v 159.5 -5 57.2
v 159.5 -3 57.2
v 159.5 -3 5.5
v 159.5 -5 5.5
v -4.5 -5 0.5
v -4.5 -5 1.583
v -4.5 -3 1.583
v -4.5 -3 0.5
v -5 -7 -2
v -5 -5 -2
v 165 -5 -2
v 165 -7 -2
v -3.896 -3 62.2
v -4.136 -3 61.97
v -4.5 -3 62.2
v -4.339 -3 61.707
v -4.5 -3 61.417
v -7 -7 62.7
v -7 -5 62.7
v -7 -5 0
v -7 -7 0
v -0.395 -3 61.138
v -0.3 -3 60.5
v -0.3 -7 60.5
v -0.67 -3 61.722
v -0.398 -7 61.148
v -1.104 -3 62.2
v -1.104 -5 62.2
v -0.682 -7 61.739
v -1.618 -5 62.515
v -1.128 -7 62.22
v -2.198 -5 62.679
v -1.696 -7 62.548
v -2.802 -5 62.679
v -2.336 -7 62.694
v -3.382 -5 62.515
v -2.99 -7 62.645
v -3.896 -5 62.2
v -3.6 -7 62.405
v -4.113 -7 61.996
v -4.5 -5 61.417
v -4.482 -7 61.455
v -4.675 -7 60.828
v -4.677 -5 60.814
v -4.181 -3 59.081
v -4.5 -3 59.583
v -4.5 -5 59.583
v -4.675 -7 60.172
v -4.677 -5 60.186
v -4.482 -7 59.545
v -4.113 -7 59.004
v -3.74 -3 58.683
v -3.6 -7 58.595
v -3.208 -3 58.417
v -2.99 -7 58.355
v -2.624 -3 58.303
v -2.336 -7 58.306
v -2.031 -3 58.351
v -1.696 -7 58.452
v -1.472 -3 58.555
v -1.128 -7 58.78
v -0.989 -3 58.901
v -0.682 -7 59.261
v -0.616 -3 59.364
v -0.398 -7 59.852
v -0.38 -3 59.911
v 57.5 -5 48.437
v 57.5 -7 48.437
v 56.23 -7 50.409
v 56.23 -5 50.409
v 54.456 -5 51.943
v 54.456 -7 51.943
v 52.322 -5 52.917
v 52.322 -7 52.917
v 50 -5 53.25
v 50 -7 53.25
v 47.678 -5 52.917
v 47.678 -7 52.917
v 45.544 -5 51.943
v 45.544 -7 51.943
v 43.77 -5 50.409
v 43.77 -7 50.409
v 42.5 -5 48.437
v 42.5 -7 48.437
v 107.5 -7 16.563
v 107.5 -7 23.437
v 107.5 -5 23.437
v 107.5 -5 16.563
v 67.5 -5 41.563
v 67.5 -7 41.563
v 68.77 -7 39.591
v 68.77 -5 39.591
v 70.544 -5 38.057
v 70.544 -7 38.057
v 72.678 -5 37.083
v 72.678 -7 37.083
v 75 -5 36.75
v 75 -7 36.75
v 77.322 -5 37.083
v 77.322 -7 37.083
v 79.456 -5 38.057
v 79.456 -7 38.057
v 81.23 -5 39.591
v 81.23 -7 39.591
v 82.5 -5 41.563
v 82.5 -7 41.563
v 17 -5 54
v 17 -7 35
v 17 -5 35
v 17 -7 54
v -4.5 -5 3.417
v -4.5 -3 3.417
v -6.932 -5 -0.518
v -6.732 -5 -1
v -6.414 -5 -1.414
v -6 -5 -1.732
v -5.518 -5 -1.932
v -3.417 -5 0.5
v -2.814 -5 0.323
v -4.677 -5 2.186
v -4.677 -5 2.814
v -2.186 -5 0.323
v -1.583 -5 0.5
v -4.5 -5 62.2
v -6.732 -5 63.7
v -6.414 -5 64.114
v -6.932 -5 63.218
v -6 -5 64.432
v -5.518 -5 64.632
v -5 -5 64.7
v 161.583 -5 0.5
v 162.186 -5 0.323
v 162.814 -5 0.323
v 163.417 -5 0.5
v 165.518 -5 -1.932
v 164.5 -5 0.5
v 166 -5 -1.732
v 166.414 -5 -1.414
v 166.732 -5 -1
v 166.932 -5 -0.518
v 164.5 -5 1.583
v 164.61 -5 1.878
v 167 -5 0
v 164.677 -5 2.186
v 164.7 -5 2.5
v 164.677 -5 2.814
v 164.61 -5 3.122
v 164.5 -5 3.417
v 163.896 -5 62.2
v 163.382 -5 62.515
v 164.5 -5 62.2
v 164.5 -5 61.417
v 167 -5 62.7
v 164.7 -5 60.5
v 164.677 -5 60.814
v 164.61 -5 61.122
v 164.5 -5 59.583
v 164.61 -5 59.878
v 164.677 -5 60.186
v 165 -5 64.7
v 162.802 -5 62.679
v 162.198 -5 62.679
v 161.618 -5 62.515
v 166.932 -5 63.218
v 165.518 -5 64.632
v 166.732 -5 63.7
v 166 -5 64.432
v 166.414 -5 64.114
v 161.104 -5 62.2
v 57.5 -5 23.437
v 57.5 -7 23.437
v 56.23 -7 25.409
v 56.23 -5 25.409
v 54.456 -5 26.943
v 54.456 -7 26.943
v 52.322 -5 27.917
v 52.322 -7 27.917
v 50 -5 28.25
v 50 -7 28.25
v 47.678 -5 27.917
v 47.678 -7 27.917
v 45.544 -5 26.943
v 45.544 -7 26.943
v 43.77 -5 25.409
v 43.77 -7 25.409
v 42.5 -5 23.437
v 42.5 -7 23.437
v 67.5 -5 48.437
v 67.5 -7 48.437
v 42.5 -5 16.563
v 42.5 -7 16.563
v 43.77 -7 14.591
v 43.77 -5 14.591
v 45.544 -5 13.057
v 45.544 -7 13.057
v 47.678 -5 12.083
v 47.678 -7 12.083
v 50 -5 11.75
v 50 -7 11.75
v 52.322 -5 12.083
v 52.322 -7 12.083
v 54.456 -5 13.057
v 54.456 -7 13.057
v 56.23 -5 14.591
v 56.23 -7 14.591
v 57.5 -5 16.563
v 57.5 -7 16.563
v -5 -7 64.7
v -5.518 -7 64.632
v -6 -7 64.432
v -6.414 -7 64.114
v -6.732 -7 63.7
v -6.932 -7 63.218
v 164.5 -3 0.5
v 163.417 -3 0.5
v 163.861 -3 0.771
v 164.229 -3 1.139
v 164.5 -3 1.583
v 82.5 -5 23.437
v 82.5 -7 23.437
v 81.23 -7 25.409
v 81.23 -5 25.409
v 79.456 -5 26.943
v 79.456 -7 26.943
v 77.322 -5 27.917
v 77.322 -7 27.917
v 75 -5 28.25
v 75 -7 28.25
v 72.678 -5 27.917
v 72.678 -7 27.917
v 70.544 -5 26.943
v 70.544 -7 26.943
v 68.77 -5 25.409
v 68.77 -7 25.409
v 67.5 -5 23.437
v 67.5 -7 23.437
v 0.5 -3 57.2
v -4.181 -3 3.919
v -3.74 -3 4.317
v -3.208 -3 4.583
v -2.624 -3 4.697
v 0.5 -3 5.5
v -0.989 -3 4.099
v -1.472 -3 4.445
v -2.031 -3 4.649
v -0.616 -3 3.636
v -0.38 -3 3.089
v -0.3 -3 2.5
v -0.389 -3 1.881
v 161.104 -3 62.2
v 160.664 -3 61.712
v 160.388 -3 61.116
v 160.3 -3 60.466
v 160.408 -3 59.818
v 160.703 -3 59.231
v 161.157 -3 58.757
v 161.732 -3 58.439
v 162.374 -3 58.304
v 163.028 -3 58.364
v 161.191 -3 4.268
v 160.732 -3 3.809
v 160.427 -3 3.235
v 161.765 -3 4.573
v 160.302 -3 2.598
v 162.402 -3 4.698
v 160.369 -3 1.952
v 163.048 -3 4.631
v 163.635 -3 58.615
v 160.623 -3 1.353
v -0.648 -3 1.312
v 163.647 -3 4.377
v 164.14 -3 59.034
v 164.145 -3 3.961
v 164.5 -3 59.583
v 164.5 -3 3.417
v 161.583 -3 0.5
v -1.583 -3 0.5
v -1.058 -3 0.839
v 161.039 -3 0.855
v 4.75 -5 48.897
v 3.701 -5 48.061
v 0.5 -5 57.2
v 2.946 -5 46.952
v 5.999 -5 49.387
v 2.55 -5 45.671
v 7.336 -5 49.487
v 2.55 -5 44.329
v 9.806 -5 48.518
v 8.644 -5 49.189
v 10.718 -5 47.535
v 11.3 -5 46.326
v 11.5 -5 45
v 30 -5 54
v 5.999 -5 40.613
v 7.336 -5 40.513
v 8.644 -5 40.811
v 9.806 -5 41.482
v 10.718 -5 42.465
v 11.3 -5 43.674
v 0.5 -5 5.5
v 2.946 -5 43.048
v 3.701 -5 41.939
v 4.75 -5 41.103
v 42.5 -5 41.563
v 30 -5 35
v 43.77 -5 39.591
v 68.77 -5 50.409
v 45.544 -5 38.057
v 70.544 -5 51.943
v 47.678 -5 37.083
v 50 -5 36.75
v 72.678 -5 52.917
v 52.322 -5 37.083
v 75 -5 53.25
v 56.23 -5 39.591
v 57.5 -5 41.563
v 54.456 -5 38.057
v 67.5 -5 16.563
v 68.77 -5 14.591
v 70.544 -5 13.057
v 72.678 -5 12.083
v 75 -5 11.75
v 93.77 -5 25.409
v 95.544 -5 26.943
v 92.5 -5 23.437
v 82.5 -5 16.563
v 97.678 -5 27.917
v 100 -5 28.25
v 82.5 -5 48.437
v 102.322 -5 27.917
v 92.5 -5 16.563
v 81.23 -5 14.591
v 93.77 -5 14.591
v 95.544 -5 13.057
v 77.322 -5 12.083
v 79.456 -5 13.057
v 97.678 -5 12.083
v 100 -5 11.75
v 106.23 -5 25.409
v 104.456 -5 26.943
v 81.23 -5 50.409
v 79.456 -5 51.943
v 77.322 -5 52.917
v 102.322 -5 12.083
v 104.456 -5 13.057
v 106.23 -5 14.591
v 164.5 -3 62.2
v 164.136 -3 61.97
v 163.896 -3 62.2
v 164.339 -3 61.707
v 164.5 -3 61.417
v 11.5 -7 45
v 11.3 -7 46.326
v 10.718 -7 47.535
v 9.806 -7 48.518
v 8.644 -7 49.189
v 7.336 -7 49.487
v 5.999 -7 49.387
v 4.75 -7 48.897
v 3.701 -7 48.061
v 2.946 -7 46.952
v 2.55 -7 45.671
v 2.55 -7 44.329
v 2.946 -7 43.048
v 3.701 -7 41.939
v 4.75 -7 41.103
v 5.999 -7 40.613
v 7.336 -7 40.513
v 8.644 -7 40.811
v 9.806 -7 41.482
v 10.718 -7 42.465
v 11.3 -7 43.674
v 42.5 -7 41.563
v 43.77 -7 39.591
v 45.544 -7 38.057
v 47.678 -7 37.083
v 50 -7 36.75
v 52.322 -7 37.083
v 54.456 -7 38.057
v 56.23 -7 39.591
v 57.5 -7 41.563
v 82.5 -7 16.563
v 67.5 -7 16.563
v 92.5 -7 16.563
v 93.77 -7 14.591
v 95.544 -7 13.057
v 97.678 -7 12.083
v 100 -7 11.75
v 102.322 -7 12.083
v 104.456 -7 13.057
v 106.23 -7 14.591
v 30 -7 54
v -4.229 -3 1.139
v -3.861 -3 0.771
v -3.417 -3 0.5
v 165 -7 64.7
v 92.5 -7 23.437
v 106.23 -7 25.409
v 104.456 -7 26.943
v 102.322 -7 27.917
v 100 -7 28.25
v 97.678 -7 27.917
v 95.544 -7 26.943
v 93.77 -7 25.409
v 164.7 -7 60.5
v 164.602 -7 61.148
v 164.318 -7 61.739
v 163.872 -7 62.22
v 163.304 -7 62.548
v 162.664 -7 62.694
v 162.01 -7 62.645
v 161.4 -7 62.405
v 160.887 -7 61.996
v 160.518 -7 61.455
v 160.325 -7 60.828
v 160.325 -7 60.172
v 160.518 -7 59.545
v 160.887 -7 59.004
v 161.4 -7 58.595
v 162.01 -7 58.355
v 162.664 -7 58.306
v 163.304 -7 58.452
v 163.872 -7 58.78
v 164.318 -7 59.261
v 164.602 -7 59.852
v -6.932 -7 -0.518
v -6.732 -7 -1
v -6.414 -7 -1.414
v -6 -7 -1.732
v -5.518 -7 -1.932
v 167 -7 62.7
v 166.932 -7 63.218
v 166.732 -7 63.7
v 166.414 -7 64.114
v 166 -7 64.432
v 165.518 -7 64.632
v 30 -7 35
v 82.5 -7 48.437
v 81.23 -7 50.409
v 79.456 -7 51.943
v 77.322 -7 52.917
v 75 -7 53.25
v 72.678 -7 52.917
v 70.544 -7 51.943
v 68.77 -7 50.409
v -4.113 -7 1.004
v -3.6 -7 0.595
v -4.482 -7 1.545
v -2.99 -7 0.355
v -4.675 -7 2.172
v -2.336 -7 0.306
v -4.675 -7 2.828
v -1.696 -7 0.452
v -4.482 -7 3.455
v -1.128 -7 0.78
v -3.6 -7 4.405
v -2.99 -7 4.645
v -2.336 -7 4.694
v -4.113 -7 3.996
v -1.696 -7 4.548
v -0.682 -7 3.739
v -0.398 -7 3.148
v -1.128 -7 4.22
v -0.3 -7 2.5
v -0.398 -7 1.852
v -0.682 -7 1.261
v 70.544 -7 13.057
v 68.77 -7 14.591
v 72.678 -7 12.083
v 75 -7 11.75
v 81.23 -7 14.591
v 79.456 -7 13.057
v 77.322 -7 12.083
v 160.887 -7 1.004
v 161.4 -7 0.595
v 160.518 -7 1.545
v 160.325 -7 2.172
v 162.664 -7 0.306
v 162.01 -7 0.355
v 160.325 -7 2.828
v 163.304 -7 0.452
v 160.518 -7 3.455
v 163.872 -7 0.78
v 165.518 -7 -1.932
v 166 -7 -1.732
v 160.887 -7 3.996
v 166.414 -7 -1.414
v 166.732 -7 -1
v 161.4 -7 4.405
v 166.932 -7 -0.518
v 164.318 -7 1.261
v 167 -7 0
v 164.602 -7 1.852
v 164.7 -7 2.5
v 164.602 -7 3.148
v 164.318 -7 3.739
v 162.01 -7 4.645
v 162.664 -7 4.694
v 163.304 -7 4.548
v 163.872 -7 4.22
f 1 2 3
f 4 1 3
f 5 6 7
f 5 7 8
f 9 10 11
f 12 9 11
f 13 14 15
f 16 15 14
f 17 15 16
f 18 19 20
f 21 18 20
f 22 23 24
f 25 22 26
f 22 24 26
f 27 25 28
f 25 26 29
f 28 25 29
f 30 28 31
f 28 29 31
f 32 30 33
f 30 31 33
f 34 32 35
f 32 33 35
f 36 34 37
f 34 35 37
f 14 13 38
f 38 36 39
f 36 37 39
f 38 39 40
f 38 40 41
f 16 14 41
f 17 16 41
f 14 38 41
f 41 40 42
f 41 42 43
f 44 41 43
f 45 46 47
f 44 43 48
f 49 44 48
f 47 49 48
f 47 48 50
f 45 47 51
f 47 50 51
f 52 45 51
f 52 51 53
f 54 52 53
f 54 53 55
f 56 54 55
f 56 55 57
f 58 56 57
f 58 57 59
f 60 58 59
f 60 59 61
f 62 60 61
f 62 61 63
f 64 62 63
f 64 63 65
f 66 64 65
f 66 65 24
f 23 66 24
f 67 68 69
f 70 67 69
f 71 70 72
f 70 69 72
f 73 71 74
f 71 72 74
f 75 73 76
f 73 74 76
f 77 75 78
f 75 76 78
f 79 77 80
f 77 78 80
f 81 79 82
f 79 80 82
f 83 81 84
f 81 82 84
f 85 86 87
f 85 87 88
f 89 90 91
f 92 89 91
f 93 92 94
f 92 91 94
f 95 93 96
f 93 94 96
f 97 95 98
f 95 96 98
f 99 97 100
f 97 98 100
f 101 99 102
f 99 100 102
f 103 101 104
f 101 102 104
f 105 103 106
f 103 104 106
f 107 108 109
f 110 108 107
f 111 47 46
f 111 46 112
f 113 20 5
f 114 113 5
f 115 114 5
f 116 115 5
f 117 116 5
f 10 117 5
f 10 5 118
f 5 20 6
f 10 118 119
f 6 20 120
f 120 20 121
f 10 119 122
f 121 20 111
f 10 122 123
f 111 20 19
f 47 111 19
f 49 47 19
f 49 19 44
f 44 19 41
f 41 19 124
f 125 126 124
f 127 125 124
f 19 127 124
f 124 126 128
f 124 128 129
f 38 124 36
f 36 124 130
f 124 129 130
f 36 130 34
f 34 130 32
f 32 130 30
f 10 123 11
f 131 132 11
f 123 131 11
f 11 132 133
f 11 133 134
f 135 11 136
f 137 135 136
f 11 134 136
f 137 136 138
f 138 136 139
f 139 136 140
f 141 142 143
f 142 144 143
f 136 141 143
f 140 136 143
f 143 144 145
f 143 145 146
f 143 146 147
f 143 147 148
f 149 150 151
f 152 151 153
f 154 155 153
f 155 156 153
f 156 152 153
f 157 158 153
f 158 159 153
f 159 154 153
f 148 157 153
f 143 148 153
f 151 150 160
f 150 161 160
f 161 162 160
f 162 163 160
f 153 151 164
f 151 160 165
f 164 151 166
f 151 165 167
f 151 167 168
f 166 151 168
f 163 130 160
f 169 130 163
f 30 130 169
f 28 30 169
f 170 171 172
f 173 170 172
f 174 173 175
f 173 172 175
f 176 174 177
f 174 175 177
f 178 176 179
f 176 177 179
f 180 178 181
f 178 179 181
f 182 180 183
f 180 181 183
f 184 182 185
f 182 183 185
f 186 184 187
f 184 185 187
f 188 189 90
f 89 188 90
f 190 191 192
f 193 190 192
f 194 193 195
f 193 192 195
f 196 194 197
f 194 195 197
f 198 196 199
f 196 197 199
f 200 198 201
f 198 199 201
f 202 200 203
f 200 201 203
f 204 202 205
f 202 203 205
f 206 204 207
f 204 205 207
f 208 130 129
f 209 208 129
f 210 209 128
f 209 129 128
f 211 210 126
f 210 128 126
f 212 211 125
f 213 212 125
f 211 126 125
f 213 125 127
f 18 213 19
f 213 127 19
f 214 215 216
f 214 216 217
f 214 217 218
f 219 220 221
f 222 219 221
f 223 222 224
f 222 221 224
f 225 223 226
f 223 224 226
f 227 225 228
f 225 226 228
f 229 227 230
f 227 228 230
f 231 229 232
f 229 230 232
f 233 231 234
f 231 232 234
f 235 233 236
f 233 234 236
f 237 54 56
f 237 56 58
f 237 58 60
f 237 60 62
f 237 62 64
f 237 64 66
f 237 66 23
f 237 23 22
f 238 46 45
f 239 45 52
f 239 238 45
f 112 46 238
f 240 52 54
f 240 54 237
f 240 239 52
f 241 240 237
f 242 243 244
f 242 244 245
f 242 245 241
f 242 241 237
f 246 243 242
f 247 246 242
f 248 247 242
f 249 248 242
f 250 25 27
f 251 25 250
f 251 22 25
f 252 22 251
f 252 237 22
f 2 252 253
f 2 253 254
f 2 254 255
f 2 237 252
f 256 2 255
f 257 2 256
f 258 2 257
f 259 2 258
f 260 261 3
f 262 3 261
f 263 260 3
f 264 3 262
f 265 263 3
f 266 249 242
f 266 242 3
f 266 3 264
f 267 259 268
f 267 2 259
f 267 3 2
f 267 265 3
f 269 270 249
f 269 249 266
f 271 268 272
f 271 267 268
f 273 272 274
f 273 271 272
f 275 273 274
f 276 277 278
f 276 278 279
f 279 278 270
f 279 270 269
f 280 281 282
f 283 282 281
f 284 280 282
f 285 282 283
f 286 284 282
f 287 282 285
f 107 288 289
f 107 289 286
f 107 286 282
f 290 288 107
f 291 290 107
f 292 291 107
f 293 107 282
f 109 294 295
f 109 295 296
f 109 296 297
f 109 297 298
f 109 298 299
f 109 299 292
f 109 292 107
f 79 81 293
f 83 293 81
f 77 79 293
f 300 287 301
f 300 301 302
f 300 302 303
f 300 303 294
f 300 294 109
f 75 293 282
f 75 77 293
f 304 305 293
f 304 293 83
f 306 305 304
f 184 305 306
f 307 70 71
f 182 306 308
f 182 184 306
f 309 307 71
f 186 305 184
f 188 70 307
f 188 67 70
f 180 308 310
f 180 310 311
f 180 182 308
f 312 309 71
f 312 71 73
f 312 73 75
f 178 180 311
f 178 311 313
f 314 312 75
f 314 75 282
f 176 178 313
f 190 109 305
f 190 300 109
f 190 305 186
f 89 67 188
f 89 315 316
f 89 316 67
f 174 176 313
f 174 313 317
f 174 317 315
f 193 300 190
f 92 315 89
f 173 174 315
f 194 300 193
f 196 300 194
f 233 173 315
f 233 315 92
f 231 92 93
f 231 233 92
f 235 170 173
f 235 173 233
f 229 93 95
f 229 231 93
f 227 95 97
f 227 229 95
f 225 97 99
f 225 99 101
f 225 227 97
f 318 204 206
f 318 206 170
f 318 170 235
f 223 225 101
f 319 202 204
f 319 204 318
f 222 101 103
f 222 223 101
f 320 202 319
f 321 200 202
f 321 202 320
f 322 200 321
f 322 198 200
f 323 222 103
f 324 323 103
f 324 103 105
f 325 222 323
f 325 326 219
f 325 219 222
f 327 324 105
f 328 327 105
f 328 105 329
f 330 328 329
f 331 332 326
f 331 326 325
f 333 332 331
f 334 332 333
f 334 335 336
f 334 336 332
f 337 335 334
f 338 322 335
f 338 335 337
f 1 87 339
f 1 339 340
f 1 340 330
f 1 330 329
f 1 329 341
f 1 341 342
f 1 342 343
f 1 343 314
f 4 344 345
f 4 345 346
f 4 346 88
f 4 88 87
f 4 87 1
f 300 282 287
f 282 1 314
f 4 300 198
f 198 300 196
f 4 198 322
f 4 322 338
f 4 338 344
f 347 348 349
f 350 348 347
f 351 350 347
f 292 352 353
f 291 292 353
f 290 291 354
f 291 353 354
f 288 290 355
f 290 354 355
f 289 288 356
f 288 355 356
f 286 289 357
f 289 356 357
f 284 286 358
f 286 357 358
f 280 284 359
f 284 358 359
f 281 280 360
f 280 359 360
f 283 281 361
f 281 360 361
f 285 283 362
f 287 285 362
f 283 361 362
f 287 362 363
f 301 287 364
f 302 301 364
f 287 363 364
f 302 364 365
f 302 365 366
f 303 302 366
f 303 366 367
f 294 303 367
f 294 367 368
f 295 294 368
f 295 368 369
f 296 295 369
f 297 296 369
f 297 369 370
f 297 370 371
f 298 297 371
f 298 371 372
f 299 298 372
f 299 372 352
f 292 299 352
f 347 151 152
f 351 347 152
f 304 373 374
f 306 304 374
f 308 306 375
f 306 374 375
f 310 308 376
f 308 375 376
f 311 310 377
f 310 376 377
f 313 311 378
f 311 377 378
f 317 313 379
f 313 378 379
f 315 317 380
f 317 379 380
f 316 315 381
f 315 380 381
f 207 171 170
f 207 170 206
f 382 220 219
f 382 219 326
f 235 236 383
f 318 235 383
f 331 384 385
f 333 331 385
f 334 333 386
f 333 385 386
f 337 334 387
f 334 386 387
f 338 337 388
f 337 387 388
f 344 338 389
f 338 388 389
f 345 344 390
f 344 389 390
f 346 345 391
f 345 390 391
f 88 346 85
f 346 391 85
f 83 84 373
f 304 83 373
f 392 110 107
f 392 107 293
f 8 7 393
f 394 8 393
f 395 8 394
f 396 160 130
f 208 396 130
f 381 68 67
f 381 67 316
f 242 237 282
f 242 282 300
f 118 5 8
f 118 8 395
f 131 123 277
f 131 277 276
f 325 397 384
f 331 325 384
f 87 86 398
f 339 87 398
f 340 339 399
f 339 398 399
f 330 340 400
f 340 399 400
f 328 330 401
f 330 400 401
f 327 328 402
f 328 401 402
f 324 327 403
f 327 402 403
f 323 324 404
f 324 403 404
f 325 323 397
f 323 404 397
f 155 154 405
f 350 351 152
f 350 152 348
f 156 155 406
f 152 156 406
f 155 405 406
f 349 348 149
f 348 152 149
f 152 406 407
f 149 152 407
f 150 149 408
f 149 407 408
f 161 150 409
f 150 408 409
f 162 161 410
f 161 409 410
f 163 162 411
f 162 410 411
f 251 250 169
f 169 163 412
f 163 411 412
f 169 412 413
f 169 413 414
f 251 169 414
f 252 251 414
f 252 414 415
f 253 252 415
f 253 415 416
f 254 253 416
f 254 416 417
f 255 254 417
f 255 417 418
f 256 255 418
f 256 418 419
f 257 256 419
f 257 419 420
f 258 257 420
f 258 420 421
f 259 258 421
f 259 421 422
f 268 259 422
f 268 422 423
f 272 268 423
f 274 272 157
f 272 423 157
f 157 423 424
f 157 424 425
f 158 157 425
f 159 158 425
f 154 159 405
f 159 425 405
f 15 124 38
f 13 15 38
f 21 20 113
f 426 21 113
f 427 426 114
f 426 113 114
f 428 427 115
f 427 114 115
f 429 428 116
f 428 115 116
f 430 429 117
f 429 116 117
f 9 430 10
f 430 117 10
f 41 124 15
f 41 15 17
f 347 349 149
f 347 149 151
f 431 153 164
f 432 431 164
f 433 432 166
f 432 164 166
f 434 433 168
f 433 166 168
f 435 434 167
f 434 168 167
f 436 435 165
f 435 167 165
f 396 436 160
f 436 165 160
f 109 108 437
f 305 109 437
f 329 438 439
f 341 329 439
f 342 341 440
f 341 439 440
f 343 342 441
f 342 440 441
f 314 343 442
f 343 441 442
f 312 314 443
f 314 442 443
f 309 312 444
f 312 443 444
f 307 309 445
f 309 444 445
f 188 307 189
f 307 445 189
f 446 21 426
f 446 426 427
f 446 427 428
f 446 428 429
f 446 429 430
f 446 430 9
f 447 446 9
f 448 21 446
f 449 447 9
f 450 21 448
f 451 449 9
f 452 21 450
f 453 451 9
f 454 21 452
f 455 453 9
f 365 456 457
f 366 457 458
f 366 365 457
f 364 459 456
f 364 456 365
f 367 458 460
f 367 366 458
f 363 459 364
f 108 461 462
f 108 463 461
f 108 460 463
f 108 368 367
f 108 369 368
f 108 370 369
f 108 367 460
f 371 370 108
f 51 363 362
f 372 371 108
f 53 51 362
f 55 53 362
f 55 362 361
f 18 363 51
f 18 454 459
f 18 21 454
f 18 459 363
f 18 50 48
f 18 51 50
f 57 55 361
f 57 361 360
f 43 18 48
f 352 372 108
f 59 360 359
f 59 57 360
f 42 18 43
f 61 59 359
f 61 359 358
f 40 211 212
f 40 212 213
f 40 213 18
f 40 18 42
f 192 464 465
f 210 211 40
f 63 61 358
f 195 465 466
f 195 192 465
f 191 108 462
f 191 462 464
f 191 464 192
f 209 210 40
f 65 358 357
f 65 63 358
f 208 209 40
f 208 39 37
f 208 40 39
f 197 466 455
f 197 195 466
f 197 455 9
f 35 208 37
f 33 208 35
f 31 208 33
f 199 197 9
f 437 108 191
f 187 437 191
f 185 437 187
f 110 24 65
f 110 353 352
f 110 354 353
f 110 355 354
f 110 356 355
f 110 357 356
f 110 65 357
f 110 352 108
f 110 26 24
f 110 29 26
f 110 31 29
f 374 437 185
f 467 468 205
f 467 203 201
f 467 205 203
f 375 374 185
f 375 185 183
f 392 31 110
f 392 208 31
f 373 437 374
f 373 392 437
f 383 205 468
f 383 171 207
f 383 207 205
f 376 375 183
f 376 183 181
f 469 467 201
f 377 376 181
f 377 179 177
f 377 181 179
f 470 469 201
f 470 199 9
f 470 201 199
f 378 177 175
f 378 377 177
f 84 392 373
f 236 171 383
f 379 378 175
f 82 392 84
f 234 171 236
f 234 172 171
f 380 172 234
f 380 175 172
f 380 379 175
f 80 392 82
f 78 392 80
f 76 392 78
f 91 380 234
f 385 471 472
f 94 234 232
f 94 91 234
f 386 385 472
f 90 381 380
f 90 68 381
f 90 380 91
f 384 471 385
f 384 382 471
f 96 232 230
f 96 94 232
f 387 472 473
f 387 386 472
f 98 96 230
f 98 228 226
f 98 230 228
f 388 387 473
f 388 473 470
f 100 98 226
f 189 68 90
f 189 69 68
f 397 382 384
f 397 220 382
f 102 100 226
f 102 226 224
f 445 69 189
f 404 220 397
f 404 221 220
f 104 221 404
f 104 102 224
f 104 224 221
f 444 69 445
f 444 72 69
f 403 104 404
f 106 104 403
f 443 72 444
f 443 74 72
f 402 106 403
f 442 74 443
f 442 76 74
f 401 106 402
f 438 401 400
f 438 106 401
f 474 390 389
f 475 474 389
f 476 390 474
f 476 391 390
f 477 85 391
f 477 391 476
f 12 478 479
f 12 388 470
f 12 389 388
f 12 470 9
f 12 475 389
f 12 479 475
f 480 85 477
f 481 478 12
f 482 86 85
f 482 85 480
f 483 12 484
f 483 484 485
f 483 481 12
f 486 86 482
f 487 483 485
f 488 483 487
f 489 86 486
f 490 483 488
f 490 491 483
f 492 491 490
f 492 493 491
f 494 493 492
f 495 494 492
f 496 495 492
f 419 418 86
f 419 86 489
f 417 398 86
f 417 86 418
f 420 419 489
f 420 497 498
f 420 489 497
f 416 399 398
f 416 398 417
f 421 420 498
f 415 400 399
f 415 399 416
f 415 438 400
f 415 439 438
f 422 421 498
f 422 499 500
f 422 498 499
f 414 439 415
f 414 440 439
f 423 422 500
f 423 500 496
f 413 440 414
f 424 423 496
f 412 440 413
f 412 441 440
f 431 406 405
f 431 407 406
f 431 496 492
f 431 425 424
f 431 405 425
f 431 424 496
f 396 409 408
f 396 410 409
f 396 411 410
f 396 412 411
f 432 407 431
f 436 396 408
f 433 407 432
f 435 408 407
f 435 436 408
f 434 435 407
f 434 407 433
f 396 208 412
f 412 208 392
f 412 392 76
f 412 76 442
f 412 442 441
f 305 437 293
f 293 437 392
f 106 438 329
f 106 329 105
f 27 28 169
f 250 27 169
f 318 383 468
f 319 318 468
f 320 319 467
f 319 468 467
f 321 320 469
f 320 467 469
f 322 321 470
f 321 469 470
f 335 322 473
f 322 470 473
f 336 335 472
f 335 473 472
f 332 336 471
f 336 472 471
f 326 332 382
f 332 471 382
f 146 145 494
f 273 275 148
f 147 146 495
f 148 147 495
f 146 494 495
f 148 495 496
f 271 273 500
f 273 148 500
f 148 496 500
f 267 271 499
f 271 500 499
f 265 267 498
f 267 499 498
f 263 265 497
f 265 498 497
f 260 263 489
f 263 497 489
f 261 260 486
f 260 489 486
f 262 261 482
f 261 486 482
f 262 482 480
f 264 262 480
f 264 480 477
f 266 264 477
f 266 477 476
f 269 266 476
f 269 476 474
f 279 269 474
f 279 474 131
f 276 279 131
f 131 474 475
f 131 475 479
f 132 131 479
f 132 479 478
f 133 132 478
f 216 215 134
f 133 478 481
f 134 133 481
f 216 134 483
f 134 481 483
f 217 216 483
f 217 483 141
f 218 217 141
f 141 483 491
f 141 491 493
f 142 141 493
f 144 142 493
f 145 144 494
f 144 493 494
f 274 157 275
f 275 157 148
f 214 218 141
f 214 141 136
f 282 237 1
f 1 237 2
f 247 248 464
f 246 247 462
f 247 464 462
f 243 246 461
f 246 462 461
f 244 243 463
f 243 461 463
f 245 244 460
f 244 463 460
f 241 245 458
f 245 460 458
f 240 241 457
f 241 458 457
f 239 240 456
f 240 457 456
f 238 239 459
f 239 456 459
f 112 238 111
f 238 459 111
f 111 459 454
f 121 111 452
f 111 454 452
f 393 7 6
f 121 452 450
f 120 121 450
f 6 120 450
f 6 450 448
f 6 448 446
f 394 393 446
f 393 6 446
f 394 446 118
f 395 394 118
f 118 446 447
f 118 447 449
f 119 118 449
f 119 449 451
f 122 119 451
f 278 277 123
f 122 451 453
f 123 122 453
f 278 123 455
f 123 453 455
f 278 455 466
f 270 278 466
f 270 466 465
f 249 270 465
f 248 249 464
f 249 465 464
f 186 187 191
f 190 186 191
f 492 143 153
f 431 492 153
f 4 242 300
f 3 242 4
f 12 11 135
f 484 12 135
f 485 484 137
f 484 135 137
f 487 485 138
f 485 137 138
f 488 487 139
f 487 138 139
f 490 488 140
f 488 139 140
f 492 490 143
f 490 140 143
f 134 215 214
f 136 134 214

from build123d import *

# Parameters (mm, degrees)
PAD004_DEPTH    = 2
SKETCH008_W     = 169
SKETCH008_H     = 61.7
PAD005_DEPTH    = 2
SKETCH009_R     = 2.2
POCKET002_DEPTH = 4.001
SKETCH012_W     = 159
SKETCH012_H     = 51.7
POCKET005_DEPTH = 2
SKETCH010_R     = 4.5
SKETCH010_W     = 13
SKETCH010_H     = 19
POCKET003_DEPTH = 4.001


with BuildPart() as part:
    # Sketch007 → Pad004 (new body)
    with BuildSketch(Plane.XZ):
        with BuildLine():
            Line((-2, 62.7), (-2, 0))
            ThreePointArc((-2, 0), (-1.414214, -1.414214), (0, -2))
            Line((0, -2), (170, -2))
            ThreePointArc((170, -2), (171.414214, -1.414214), (172, 0))
            Line((172, 0), (172, 62.7))
            ThreePointArc((172, 62.7), (171.414214, 64.114214), (170, 64.7))
            Line((170, 64.7), (0, 64.7))
            ThreePointArc((0, 64.7), (-1.414214, 64.114214), (-2, 62.7))
        make_face()
    extrude(amount=PAD004_DEPTH)

    # Sketch008 (on Face9 of Pad004) → Pad005 (join)
    with BuildSketch(Plane(origin=(0, 0, 0), x_dir=(1, 0, 0), z_dir=(0, 1, 0))):
        with Locations((85, -31.35)):
            Rectangle(SKETCH008_W, SKETCH008_H)
    extrude(amount=PAD005_DEPTH)

    # Sketch009 (on Face5 of Pad005) → Pocket002 (cut, through all)
    with BuildSketch(Plane.XZ.offset(2)):
        with Locations((2.5, 2.5)):
            Circle(SKETCH009_R)
        with Locations((2.5, 60.5)):
            Circle(SKETCH009_R)
        with Locations((167.5, 60.5)):
            Circle(SKETCH009_R)
        with Locations((167.5, 2.5)):
            Circle(SKETCH009_R)
    extrude(amount=-POCKET002_DEPTH, mode=Mode.SUBTRACT)

    # Sketch012 (on Face28 of Pocket002) → Pocket005 (cut)
    with BuildSketch(Plane(origin=(0, 2, 0), x_dir=(1, 0, 0), z_dir=(0, 1, 0))):
        with Locations((85, -31.35)):
            Rectangle(SKETCH012_W, SKETCH012_H)
    extrude(amount=-POCKET005_DEPTH, mode=Mode.SUBTRACT)


with BuildPart() as part_1:
    # Body003 placement: moved
    add(part.part.moved(Location((-5, -5, 0))))


with BuildPart() as part_2:
    # BaseFeature placement: moved
    add(part_1.part.moved(Location((5, 5, 0))))

    # Sketch010 (on Face5 of BaseFeature) → Pocket003 (cut, through all)
    with BuildSketch(Plane.XZ.offset(2)):
        with Locations((12, 45)):
            Circle(SKETCH010_R)
        with Locations((28.5, 44.5)):
            Rectangle(SKETCH010_W, SKETCH010_H)
        with BuildLine():
            Line((62.5, 23.436932), (62.5, 16.563068))
            ThreePointArc((47.5, 16.563068), (55, 11.75), (62.5, 16.563068))
            Line((47.5, 23.436932), (47.5, 16.563068))
            ThreePointArc((62.5, 23.436932), (55, 28.25), (47.5, 23.436932))
        make_face()
        with BuildLine():
            ThreePointArc((47.5, 41.563068), (55, 36.75), (62.5, 41.563068))
            Line((62.5, 48.436932), (62.5, 41.563068))
            ThreePointArc((62.5, 48.436932), (55, 53.25), (47.5, 48.436932))
            Line((47.5, 48.436932), (47.5, 41.563068))
        make_face()
        with BuildLine():
            ThreePointArc((87.5, 23.436932), (80, 28.25), (72.5, 23.436932))
            Line((72.5, 23.436932), (72.5, 16.563068))
            ThreePointArc((72.5, 16.563068), (80, 11.75), (87.5, 16.563068))
            Line((87.5, 23.436932), (87.5, 16.563068))
        make_face()
        with BuildLine():
            Line((97.5, 23.436932), (97.5, 16.563068))
            ThreePointArc((97.5, 16.563068), (105, 11.75), (112.5, 16.563068))
            Line((112.5, 23.436932), (112.5, 16.563068))
            ThreePointArc((112.5, 23.436932), (105, 28.25), (97.5, 23.436932))
        make_face()
        with BuildLine():
            Line((72.5, 48.436932), (72.5, 41.563068))
            ThreePointArc((72.5, 41.563068), (80, 36.75), (87.5, 41.563068))
            Line((87.5, 48.436932), (87.5, 41.563068))
            ThreePointArc((87.5, 48.436932), (80, 53.25), (72.5, 48.436932))
        make_face()
    extrude(amount=-POCKET003_DEPTH, mode=Mode.SUBTRACT)


with BuildPart() as part_3:
    # Body004 placement: moved
    add(part_2.part.moved(Location((-5, -5, 0))))


solid = part_3.part
